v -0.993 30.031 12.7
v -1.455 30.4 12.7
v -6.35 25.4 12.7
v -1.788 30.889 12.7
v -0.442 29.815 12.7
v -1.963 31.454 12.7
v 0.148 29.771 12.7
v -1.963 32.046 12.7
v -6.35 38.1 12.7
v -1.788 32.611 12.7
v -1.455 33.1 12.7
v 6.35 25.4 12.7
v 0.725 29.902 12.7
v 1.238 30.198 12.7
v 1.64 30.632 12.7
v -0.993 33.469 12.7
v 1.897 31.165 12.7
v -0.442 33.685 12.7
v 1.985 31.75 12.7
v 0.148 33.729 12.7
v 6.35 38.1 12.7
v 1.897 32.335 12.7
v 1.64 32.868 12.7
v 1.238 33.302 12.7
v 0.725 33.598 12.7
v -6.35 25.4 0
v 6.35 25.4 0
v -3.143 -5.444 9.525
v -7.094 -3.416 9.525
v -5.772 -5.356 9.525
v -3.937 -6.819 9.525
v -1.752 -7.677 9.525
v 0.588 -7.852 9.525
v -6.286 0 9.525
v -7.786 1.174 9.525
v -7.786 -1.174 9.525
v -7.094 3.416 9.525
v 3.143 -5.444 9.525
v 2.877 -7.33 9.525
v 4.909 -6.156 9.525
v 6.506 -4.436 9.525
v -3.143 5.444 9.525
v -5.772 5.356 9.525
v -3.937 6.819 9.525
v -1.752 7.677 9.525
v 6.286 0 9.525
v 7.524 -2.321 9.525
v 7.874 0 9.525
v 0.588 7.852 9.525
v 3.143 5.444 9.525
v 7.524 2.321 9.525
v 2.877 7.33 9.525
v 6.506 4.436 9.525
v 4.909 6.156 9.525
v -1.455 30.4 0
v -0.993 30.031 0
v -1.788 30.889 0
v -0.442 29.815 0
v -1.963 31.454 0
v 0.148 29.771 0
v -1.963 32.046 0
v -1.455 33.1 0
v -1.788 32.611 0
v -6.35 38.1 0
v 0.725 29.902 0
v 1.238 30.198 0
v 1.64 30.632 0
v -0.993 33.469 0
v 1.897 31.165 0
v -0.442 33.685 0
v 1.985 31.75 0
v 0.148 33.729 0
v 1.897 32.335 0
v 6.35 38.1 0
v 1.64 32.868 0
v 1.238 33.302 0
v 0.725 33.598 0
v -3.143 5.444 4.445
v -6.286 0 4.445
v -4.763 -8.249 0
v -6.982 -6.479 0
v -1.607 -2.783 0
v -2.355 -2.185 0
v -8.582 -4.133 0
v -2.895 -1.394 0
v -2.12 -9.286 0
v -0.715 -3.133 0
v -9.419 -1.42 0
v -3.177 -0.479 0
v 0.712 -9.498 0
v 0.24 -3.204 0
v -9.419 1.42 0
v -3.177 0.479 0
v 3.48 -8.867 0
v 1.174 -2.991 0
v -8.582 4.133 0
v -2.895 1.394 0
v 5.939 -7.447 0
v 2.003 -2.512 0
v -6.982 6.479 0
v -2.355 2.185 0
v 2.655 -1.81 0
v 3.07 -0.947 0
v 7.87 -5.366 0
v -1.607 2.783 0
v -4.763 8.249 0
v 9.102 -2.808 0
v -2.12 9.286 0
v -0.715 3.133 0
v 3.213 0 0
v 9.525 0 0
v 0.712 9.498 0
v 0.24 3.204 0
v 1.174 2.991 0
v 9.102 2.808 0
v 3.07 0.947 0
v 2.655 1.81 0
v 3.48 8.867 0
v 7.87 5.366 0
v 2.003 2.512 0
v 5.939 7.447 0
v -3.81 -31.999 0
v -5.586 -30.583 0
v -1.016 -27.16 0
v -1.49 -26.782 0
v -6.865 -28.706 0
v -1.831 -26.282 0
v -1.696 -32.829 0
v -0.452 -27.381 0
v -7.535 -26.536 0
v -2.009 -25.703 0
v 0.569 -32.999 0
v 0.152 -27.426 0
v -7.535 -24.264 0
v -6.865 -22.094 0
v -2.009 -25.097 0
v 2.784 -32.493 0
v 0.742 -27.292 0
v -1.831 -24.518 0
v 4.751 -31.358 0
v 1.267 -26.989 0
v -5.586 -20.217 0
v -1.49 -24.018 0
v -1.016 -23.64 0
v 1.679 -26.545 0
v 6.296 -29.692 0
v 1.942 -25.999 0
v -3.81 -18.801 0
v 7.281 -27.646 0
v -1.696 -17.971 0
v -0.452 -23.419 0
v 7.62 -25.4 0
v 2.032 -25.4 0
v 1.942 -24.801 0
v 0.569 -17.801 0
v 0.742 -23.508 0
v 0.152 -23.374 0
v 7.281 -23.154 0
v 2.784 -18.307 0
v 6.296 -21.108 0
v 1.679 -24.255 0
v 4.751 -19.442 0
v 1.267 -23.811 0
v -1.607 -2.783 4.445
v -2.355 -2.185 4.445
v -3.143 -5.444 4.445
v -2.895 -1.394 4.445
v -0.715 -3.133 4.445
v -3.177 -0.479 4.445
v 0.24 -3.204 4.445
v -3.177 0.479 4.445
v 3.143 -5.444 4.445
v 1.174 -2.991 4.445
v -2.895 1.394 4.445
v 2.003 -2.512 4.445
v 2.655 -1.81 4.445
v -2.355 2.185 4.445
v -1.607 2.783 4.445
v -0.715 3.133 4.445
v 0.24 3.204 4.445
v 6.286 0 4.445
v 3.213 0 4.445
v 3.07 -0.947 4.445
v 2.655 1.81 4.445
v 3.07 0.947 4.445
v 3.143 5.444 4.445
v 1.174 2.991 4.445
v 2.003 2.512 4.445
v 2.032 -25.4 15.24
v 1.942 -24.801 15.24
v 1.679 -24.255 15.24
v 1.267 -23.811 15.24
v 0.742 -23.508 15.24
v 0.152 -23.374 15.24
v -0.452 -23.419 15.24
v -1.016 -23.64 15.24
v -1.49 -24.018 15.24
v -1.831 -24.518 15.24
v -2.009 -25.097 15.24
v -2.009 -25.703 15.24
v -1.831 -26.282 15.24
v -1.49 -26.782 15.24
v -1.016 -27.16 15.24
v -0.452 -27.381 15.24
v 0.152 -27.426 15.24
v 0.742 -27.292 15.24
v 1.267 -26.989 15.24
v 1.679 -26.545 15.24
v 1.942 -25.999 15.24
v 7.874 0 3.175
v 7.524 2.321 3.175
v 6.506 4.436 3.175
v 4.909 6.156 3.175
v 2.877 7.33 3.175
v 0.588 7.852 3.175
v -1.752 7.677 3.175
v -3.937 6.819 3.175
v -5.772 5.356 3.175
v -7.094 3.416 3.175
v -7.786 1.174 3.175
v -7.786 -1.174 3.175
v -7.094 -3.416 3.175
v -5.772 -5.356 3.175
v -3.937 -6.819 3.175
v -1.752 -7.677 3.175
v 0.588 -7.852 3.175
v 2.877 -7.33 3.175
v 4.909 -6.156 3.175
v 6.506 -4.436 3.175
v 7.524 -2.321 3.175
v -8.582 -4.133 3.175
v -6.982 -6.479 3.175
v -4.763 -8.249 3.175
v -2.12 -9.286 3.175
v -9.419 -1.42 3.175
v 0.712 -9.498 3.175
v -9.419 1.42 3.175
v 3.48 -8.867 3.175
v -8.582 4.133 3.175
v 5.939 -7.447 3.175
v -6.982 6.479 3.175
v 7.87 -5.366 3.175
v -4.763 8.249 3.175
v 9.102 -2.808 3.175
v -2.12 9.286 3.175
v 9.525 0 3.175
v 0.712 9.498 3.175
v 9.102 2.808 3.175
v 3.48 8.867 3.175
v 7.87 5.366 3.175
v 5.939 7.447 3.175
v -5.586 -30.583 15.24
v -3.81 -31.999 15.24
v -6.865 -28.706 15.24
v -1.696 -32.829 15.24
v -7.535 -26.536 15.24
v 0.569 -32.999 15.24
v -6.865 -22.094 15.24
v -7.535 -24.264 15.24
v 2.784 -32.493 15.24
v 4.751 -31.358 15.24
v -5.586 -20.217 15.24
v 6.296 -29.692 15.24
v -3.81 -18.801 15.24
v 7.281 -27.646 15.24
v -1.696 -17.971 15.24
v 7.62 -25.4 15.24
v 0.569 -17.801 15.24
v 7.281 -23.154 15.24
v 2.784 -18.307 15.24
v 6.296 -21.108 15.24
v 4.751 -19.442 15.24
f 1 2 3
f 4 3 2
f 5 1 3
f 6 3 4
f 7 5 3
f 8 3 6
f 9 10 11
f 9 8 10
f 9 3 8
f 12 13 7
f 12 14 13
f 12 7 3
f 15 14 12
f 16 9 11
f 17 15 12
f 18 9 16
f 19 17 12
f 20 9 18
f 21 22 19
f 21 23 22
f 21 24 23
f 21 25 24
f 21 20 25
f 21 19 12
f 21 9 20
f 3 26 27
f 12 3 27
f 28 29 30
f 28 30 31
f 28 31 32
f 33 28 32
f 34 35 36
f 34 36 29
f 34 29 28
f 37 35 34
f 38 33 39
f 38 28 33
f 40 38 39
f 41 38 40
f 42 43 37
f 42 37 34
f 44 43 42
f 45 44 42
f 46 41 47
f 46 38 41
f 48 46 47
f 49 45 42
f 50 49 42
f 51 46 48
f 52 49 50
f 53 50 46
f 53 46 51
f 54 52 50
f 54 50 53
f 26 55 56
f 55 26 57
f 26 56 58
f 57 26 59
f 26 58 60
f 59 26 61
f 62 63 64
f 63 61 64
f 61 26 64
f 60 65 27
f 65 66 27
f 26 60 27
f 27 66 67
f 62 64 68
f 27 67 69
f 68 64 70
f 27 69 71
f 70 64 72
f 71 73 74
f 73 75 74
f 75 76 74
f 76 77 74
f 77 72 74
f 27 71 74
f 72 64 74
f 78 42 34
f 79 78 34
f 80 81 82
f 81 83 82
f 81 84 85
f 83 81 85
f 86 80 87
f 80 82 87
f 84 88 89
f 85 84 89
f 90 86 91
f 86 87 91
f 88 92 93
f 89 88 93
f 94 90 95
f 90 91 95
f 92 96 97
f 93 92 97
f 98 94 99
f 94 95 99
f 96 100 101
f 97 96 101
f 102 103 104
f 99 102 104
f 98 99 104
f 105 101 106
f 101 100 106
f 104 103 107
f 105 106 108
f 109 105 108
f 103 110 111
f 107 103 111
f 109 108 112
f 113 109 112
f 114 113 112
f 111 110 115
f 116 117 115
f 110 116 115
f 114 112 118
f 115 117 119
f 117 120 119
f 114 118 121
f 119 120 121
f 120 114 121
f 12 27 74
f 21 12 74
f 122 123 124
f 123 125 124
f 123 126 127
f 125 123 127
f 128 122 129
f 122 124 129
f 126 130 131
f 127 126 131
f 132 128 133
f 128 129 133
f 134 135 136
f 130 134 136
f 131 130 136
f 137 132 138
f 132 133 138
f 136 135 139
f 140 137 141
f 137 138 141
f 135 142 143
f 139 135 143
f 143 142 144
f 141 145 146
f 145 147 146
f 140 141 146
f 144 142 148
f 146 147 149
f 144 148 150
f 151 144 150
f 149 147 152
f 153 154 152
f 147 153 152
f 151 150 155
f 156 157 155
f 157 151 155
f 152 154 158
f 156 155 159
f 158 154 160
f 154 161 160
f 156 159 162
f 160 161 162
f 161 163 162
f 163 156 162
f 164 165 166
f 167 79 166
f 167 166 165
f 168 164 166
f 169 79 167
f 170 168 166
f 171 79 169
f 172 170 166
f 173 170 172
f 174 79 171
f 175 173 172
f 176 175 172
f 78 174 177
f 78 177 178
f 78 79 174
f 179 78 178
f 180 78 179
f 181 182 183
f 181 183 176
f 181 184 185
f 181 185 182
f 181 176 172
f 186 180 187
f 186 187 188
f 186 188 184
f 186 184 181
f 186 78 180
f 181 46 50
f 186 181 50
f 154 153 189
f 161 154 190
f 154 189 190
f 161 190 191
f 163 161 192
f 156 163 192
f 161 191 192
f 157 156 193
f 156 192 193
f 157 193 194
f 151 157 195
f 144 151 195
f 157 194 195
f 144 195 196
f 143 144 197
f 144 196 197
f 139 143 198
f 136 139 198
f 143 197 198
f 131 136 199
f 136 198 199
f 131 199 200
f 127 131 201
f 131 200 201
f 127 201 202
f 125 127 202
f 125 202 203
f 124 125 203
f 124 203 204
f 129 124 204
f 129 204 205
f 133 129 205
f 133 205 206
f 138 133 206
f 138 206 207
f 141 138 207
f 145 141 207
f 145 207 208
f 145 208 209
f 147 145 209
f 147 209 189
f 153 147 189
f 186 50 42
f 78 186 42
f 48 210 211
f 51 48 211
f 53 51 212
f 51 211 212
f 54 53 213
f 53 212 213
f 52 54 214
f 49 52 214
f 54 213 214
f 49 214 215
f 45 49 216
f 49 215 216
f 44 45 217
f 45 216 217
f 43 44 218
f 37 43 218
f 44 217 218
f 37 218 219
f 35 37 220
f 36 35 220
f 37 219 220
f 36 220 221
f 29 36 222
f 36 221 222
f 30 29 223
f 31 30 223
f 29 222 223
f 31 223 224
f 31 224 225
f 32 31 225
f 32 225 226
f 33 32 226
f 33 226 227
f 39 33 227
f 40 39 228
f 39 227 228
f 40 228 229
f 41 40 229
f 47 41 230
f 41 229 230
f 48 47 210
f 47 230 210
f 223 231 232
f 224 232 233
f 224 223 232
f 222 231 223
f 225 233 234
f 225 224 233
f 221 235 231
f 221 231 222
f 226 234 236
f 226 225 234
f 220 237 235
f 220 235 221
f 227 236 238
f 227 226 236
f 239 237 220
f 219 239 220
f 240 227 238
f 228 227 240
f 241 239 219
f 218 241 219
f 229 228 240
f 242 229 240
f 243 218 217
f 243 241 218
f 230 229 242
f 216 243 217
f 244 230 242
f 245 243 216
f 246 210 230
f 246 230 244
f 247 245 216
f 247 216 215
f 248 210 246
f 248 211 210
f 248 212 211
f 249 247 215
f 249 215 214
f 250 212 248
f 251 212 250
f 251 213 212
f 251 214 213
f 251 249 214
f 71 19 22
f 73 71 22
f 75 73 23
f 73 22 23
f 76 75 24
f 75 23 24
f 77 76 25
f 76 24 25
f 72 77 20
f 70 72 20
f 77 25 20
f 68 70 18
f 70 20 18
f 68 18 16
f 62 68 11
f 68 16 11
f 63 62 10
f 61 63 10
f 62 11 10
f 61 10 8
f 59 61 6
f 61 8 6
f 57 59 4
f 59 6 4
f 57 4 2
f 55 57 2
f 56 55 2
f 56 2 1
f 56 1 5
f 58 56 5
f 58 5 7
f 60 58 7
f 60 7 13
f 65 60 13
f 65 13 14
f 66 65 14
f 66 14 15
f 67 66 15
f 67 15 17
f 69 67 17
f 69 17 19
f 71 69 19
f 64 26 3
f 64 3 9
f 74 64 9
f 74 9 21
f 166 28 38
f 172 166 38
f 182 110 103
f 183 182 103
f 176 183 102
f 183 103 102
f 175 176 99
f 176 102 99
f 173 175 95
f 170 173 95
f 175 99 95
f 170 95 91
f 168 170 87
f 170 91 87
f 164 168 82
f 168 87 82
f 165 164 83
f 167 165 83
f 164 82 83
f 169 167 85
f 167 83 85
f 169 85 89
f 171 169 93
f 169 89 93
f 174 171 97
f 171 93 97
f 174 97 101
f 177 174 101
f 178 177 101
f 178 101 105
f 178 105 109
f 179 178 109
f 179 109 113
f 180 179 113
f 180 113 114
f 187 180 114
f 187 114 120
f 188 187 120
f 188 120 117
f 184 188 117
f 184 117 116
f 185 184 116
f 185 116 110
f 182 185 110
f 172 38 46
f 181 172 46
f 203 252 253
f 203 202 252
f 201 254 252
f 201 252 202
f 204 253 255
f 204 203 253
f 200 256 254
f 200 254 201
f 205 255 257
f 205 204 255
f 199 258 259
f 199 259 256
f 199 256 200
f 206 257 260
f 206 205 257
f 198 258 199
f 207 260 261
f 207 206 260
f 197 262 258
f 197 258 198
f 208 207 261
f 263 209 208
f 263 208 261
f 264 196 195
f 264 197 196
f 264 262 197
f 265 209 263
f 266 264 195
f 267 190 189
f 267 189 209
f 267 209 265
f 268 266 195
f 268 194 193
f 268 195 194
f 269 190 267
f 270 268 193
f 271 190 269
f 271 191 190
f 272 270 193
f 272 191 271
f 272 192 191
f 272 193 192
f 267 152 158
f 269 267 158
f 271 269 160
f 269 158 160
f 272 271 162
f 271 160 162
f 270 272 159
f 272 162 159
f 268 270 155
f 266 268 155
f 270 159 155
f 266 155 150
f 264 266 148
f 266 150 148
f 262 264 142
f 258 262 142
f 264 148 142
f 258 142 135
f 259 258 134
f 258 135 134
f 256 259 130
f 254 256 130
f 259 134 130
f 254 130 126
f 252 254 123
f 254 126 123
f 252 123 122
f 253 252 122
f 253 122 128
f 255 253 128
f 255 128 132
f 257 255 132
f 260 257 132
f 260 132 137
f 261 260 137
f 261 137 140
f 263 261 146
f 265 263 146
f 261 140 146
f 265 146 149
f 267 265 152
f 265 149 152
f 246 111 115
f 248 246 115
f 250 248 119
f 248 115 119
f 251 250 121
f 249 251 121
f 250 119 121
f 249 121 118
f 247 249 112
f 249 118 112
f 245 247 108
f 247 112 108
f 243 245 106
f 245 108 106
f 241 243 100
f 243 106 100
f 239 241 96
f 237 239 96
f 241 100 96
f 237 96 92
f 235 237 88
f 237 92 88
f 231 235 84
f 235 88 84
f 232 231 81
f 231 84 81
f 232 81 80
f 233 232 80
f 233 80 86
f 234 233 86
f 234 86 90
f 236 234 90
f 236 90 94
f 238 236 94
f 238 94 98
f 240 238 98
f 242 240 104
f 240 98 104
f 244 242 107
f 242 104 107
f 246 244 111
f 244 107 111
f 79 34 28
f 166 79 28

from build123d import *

# Parameters (mm, degrees)
F0_R      = 9.525
F1_DEPTH  = 3.175
F2_R      = 7.874
F3_DEPTH  = 6.35
F5_DEPTH  = 5.08
F6_R      = 3.2131
F7_DEPTH  = 9.526
F8_W      = 12.7
F8_H      = 12.7
F9_DEPTH  = 12.7
F10_R     = 1.98501
F11_DEPTH = 12.701
F12_R     = 7.62
F13_DEPTH = 15.24
F14_R     = 2.032
F15_DEPTH = 15.241


with BuildPart() as f1:
    # F0 (on Top) → F1 (new body)
    with BuildSketch(Plane.XY):
        Circle(F0_R)
    extrude(amount=F1_DEPTH)

    # F2 (on face) → F3 (join)
    with BuildSketch(Plane.XY.offset(3.175)):
        Circle(F2_R)
    extrude(amount=F3_DEPTH)

    # F4 (on face) → F5 (cut)
    with BuildSketch(Plane.XY.offset(9.525)):
        Polygon((6.2865, 0), (3.14325, 5.444269), (-3.14325, 5.444269), (-6.2865, 0), (-3.14325, -5.444269), (3.14325, -5.444269), align=None)
    extrude(amount=-F5_DEPTH, mode=Mode.SUBTRACT)

    # F6 (on face) → F7 (cut, through all)
    with BuildSketch(Plane(origin=(0, 0, 0), x_dir=(1, 0, 0), z_dir=(0, 0, -1))):
        Circle(F6_R)
    extrude(amount=-F7_DEPTH, mode=Mode.SUBTRACT)


with BuildPart() as f9:
    # F8 (on Top) → F9 (new body)
    with BuildSketch(Plane.XY):
        with Locations((0, 31.75)):
            Rectangle(F8_W, F8_H)
    extrude(amount=F9_DEPTH)

    # F10 (on face) → F11 (cut, through all)
    with BuildSketch(Plane.XY.offset(12.7)):
        with Locations((0, 31.75)):
            Circle(F10_R)
    extrude(amount=-F11_DEPTH, mode=Mode.SUBTRACT)


with BuildPart() as f13:
    # F12 (on Top) → F13 (new body)
    with BuildSketch(Plane.XY):
        with Locations((0, -25.4)):
            Circle(F12_R)
    extrude(amount=F13_DEPTH)

    # F14 (on face) → F15 (cut, through all)
    with BuildSketch(Plane.XY.offset(15.24)):
        with Locations((0, -25.4)):
            Circle(F14_R)
    extrude(amount=-F15_DEPTH, mode=Mode.SUBTRACT)


solid = Compound([f1.part, f9.part, f13.part])
